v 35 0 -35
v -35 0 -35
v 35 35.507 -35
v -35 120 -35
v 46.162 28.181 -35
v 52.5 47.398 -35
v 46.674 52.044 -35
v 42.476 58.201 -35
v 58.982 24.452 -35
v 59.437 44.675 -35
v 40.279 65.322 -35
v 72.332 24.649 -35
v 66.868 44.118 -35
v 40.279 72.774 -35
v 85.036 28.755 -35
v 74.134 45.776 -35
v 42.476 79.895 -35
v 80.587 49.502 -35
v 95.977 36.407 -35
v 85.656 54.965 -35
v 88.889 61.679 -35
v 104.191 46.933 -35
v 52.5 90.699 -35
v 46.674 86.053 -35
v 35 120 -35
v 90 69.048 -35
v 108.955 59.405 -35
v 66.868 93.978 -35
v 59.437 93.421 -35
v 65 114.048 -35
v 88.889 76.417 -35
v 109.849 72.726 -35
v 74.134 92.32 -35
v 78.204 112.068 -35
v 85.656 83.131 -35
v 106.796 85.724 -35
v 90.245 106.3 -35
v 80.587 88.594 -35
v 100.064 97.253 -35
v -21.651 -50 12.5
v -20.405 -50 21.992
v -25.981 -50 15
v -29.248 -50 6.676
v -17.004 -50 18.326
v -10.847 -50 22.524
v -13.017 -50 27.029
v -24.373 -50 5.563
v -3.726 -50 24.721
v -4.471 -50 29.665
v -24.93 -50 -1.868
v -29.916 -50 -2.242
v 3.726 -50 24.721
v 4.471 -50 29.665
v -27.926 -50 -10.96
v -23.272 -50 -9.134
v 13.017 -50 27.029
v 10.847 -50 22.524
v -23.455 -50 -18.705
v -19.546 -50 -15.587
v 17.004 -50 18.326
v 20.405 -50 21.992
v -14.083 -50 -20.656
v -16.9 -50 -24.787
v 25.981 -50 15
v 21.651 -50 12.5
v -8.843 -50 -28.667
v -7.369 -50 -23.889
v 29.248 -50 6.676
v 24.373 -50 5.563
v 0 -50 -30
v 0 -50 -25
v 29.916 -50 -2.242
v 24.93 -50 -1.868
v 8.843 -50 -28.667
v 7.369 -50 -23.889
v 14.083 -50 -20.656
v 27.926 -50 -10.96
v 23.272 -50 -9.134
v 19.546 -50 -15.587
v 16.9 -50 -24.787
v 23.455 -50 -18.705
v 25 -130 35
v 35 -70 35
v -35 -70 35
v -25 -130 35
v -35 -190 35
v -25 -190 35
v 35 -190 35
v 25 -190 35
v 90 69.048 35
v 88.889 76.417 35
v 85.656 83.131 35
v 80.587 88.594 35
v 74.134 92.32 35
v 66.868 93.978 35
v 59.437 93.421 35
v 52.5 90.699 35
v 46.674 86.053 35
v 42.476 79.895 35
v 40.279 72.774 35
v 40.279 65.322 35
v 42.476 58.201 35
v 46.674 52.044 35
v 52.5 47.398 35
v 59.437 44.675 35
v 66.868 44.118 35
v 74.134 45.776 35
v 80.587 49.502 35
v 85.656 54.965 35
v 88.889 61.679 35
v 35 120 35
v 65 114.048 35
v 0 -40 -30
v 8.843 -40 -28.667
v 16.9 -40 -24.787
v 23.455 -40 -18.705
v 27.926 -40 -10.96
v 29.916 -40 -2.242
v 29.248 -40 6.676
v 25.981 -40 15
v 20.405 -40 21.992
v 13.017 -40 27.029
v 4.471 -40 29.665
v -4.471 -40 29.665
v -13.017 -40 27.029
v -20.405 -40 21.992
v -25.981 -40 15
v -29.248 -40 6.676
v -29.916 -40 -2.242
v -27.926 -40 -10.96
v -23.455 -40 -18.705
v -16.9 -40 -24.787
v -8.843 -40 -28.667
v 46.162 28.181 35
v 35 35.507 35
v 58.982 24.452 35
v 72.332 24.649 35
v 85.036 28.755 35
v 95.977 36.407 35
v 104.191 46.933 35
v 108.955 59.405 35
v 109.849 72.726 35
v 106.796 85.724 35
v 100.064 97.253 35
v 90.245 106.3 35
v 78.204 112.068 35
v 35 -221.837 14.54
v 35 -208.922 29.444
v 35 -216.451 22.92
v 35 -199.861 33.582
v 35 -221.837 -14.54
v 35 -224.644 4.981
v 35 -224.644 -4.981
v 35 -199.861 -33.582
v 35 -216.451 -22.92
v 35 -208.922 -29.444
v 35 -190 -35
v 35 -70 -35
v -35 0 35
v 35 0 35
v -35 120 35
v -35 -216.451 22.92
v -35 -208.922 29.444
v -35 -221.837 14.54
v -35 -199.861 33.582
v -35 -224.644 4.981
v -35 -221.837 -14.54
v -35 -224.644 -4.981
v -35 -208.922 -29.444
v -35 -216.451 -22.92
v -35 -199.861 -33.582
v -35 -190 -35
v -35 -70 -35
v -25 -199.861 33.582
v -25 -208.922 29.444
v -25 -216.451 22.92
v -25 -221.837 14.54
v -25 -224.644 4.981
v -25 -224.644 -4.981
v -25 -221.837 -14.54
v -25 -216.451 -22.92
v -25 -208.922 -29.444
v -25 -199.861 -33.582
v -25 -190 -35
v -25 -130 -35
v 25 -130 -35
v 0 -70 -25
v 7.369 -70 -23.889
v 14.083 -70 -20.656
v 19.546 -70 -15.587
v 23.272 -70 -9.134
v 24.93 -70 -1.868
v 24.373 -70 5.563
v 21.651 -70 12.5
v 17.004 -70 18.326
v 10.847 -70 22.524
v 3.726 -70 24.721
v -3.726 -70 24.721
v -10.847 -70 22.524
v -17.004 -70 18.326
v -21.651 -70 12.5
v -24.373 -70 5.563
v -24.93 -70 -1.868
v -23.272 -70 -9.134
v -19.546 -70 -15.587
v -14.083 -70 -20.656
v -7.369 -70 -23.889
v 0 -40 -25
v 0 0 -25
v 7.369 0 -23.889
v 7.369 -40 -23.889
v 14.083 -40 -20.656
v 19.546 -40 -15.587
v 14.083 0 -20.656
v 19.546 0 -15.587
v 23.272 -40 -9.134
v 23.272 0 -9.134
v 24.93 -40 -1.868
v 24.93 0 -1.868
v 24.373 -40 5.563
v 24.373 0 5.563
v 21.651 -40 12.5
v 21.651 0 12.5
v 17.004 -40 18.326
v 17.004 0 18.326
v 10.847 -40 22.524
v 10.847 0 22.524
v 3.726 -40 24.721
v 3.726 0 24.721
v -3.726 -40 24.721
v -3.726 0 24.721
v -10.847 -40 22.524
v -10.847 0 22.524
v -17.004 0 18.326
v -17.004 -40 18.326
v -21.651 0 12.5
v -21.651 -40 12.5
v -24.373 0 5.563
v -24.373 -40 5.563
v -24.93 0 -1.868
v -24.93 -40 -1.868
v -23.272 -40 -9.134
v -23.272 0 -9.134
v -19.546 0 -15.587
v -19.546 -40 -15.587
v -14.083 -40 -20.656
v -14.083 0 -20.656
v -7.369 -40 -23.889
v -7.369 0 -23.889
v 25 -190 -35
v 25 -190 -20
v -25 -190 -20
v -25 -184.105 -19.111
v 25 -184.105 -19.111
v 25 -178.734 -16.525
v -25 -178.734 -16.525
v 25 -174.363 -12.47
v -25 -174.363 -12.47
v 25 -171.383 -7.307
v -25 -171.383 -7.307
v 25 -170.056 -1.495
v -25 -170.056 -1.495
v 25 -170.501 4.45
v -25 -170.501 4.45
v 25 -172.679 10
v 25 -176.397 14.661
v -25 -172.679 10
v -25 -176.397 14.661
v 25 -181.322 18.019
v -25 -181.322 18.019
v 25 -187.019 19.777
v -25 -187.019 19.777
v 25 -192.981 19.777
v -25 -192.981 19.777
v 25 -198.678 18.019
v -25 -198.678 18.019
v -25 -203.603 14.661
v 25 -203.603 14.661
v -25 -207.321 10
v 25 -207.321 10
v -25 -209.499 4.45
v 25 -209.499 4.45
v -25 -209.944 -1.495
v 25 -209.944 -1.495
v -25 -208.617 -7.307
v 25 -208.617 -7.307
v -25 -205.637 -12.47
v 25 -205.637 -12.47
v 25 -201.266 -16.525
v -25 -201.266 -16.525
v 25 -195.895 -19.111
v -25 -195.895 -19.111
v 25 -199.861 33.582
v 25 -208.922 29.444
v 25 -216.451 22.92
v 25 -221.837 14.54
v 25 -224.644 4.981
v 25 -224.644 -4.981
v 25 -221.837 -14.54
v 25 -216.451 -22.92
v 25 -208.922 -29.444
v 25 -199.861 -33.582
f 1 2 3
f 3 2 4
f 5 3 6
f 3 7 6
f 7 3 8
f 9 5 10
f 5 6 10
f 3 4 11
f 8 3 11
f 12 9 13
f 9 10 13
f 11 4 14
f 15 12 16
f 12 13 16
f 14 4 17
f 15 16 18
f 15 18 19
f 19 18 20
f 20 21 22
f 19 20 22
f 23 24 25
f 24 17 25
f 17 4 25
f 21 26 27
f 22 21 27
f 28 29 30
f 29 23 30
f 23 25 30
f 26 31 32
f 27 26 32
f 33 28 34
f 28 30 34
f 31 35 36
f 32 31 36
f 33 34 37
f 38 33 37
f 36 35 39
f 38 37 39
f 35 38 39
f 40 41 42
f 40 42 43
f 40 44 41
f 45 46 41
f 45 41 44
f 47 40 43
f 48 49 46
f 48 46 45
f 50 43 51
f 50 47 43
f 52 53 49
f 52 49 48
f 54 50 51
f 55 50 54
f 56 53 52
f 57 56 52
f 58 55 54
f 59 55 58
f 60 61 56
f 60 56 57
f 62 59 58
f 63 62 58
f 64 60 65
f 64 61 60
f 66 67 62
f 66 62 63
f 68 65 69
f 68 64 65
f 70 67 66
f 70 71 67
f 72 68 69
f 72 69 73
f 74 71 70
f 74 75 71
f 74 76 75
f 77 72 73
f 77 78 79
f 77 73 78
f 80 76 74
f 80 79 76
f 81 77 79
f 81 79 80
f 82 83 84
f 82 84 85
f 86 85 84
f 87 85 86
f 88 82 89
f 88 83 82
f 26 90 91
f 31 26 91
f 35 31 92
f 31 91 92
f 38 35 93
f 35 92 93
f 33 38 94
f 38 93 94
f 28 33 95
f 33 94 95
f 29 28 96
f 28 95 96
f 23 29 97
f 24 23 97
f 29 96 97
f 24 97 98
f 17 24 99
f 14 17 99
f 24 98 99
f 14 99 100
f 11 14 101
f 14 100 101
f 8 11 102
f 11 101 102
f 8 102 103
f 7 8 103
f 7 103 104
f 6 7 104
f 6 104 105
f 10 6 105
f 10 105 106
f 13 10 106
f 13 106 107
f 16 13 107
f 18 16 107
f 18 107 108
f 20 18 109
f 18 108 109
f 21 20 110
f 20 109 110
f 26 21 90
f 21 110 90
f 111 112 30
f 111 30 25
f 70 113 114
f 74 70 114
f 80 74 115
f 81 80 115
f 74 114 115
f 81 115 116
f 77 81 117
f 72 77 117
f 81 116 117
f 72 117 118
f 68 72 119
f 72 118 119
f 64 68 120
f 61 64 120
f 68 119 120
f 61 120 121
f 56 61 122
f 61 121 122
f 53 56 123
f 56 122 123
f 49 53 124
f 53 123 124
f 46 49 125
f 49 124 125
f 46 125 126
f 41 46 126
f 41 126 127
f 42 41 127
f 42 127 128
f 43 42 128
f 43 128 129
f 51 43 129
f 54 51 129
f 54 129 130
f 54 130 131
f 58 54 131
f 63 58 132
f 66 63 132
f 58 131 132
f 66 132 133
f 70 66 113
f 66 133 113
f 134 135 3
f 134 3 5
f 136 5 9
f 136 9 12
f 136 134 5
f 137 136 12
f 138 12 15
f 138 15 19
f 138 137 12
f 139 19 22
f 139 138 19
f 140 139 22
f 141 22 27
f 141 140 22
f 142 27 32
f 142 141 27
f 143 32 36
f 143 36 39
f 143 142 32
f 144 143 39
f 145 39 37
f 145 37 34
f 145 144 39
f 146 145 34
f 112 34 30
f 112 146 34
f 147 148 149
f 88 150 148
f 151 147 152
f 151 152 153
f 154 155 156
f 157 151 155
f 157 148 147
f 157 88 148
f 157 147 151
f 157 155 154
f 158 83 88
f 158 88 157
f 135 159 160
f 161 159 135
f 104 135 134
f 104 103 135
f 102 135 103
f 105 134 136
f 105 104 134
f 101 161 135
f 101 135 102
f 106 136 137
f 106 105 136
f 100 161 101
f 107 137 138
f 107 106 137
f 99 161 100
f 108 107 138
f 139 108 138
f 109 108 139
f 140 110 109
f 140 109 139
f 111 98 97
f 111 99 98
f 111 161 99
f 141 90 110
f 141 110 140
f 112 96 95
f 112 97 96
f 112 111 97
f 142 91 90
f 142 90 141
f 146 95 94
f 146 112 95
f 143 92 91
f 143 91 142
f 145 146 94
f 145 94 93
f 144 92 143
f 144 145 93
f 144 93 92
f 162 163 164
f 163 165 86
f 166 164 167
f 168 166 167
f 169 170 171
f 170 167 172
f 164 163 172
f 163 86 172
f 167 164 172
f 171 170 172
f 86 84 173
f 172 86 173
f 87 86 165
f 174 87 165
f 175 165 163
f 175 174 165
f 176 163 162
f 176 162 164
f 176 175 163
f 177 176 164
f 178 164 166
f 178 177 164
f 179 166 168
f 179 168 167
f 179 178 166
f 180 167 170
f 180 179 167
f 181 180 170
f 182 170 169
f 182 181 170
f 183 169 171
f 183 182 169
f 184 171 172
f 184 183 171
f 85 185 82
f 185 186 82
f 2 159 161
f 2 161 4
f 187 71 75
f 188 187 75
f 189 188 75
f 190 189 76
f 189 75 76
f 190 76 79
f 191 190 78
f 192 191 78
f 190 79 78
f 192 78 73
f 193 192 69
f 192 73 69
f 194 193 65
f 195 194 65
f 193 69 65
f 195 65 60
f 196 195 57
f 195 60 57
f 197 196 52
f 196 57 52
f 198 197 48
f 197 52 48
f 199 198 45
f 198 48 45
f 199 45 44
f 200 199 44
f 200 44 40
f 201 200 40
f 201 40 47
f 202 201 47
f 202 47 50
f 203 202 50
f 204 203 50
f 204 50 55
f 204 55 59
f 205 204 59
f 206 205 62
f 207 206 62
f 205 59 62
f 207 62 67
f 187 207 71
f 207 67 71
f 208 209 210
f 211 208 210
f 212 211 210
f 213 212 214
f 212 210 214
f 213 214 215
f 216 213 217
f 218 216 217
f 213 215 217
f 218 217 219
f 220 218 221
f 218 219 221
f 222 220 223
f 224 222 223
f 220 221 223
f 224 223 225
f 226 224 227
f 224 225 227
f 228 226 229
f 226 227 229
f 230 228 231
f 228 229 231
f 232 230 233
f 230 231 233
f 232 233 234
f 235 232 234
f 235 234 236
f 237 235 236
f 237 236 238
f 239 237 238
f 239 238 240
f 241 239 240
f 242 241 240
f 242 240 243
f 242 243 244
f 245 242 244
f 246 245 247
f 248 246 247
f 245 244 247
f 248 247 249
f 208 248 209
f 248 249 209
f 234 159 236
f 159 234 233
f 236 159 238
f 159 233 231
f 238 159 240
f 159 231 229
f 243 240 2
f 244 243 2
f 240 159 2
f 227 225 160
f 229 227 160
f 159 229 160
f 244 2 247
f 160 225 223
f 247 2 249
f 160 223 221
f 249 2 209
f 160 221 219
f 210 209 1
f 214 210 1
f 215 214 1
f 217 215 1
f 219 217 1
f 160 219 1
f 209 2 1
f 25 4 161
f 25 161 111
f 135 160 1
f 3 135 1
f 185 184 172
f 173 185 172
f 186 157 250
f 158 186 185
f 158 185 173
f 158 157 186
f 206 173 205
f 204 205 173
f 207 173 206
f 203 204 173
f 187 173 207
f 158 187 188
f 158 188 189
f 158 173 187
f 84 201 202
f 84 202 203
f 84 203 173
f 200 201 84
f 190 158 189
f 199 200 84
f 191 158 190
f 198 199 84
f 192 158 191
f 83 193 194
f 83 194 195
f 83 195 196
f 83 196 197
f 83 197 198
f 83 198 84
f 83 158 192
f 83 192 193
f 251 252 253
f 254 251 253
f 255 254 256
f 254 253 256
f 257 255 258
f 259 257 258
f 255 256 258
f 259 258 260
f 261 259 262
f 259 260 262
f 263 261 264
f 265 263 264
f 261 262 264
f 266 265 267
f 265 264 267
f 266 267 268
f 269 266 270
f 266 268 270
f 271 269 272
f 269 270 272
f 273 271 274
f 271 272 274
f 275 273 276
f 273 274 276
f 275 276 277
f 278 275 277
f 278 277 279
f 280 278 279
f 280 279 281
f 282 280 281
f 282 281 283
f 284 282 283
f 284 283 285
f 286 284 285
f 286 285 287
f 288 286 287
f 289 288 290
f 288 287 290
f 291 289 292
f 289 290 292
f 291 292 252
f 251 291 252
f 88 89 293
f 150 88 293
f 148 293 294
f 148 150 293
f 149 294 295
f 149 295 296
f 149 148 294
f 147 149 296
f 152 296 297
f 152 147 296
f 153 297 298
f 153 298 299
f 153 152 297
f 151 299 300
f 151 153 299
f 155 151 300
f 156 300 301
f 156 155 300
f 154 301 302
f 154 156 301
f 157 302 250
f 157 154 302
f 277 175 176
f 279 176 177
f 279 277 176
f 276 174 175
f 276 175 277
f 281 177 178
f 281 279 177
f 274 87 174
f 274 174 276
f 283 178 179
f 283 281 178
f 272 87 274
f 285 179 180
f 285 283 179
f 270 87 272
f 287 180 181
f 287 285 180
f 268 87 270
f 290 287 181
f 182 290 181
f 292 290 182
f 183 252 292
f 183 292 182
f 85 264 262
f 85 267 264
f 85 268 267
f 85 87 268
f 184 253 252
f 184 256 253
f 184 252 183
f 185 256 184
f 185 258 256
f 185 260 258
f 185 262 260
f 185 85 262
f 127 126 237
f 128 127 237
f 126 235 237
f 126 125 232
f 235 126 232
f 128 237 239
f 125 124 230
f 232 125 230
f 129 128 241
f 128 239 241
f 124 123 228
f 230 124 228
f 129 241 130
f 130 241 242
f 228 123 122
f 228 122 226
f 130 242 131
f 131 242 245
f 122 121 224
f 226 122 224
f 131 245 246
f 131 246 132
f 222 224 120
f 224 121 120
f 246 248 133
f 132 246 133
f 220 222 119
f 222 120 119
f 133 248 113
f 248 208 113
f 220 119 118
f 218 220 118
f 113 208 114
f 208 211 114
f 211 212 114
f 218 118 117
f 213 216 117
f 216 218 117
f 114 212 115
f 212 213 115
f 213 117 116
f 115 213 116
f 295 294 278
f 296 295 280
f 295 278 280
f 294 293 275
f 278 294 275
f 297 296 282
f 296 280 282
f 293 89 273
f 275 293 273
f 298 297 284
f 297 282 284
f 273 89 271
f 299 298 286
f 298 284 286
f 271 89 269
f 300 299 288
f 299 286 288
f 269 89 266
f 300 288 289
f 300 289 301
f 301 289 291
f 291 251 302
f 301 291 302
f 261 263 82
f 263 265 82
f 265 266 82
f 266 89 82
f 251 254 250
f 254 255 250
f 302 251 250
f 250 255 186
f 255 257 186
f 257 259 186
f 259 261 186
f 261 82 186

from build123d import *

# Parameters (mm, degrees)
SKETCH1_W           = 70
SKETCH1_H           = 70
BOSS_EXTRUDE1_DEPTH = 120
SKETCH2_R           = 25
BOSS_EXTRUDE2_DEPTH = 40
SKETCH3_R           = 30
BOSS_EXTRUDE3_DEPTH = 10
SKETCH4_R           = 25
BOSS_EXTRUDE4_DEPTH = 70
SKETCH5_R           = 25
BOSS_EXTRUDE5_DEPTH = 20
BOSS_EXTRUDE6_DEPTH = 35
CUT_EXTRUDE1_DEPTH  = 25
SKETCH9_R           = 20
BOSS_EXTRUDE7_DEPTH = 50


with BuildPart() as part:
    # Sketch1 → Boss-Extrude1 (new body)
    with BuildSketch(Plane(origin=(0, 0, 0), x_dir=(1, 0, 0), z_dir=(0, 1, 0))):
        Rectangle(SKETCH1_W, SKETCH1_H)
    extrude(amount=BOSS_EXTRUDE1_DEPTH)

    # Sketch2 → Boss-Extrude2 (add)
    with BuildSketch(Plane.XZ):
        with Locations(Location((0, 0, 0), (0, 0, 270))):
            Circle(SKETCH2_R)
    extrude(amount=BOSS_EXTRUDE2_DEPTH)

    # Sketch3 → Boss-Extrude3 (add)
    with BuildSketch(Plane.XZ.offset(40)):
        with Locations(Location((0, 0, 0), (0, 0, 270))):
            Circle(SKETCH3_R)
    extrude(amount=BOSS_EXTRUDE3_DEPTH)

    # Sketch4 → Boss-Extrude4 (add)
    with BuildSketch(Plane.XY.offset(35)):
        with BuildLine():
            Line((65, 114.048192782), (35, 120))
            Line((35, 120), (35, 35.50717312))
            ThreePointArc((35, 35.50717312), (107.037756153, 52.991198743), (65, 114.048192782))
        make_face()
        with Locations((65, 69.048192782)):
            Circle(SKETCH4_R, mode=Mode.SUBTRACT)
    extrude(amount=-BOSS_EXTRUDE4_DEPTH)

    # Sketch5 → Boss-Extrude5 (add)
    with BuildSketch(Plane.XZ.offset(50)):
        with Locations(Location((0, 0, 0), (0, 0, 270))):
            Circle(SKETCH5_R)
    extrude(amount=BOSS_EXTRUDE5_DEPTH)

    # Sketch6 → Boss-Extrude6 (add, symmetric)
    with BuildSketch(Plane(origin=(0, 0, 0), x_dir=(0, 0, -1), z_dir=(1, 0, 0))):
        with BuildLine():
            ThreePointArc((-35, -190), (0, -225), (35, -190))
            Line((35, -190), (35, -155))
            Line((35, -155), (35, -70))
            Line((35, -70), (-35, -70))
            Line((-35, -70), (-35, -155))
            Line((-35, -155), (-35, -190))
        make_face()
    extrude(amount=BOSS_EXTRUDE6_DEPTH, both=True)

    # Sketch8 → Cut-Extrude1 (cut, symmetric)
    with BuildSketch(Plane(origin=(0, 0, 0), x_dir=(0, 0, -1), z_dir=(1, 0, 0))):
        with BuildLine():
            Line((-35, -130), (-35, -190))
            ThreePointArc((-35, -190), (0, -225), (35, -190))
            Line((35, -190), (35, -130))
            Line((35, -130), (-35, -130))
        make_face()
    extrude(amount=CUT_EXTRUDE1_DEPTH, both=True, mode=Mode.SUBTRACT)

    # Sketch9 → Boss-Extrude7 (add)
    with BuildSketch(Plane(origin=(-25, 0, 0), x_dir=(0, 0, -1), z_dir=(1, 0, 0))):
        with Locations((0, -190)):
            Circle(SKETCH9_R)
    extrude(amount=BOSS_EXTRUDE7_DEPTH)


solid = part.part
